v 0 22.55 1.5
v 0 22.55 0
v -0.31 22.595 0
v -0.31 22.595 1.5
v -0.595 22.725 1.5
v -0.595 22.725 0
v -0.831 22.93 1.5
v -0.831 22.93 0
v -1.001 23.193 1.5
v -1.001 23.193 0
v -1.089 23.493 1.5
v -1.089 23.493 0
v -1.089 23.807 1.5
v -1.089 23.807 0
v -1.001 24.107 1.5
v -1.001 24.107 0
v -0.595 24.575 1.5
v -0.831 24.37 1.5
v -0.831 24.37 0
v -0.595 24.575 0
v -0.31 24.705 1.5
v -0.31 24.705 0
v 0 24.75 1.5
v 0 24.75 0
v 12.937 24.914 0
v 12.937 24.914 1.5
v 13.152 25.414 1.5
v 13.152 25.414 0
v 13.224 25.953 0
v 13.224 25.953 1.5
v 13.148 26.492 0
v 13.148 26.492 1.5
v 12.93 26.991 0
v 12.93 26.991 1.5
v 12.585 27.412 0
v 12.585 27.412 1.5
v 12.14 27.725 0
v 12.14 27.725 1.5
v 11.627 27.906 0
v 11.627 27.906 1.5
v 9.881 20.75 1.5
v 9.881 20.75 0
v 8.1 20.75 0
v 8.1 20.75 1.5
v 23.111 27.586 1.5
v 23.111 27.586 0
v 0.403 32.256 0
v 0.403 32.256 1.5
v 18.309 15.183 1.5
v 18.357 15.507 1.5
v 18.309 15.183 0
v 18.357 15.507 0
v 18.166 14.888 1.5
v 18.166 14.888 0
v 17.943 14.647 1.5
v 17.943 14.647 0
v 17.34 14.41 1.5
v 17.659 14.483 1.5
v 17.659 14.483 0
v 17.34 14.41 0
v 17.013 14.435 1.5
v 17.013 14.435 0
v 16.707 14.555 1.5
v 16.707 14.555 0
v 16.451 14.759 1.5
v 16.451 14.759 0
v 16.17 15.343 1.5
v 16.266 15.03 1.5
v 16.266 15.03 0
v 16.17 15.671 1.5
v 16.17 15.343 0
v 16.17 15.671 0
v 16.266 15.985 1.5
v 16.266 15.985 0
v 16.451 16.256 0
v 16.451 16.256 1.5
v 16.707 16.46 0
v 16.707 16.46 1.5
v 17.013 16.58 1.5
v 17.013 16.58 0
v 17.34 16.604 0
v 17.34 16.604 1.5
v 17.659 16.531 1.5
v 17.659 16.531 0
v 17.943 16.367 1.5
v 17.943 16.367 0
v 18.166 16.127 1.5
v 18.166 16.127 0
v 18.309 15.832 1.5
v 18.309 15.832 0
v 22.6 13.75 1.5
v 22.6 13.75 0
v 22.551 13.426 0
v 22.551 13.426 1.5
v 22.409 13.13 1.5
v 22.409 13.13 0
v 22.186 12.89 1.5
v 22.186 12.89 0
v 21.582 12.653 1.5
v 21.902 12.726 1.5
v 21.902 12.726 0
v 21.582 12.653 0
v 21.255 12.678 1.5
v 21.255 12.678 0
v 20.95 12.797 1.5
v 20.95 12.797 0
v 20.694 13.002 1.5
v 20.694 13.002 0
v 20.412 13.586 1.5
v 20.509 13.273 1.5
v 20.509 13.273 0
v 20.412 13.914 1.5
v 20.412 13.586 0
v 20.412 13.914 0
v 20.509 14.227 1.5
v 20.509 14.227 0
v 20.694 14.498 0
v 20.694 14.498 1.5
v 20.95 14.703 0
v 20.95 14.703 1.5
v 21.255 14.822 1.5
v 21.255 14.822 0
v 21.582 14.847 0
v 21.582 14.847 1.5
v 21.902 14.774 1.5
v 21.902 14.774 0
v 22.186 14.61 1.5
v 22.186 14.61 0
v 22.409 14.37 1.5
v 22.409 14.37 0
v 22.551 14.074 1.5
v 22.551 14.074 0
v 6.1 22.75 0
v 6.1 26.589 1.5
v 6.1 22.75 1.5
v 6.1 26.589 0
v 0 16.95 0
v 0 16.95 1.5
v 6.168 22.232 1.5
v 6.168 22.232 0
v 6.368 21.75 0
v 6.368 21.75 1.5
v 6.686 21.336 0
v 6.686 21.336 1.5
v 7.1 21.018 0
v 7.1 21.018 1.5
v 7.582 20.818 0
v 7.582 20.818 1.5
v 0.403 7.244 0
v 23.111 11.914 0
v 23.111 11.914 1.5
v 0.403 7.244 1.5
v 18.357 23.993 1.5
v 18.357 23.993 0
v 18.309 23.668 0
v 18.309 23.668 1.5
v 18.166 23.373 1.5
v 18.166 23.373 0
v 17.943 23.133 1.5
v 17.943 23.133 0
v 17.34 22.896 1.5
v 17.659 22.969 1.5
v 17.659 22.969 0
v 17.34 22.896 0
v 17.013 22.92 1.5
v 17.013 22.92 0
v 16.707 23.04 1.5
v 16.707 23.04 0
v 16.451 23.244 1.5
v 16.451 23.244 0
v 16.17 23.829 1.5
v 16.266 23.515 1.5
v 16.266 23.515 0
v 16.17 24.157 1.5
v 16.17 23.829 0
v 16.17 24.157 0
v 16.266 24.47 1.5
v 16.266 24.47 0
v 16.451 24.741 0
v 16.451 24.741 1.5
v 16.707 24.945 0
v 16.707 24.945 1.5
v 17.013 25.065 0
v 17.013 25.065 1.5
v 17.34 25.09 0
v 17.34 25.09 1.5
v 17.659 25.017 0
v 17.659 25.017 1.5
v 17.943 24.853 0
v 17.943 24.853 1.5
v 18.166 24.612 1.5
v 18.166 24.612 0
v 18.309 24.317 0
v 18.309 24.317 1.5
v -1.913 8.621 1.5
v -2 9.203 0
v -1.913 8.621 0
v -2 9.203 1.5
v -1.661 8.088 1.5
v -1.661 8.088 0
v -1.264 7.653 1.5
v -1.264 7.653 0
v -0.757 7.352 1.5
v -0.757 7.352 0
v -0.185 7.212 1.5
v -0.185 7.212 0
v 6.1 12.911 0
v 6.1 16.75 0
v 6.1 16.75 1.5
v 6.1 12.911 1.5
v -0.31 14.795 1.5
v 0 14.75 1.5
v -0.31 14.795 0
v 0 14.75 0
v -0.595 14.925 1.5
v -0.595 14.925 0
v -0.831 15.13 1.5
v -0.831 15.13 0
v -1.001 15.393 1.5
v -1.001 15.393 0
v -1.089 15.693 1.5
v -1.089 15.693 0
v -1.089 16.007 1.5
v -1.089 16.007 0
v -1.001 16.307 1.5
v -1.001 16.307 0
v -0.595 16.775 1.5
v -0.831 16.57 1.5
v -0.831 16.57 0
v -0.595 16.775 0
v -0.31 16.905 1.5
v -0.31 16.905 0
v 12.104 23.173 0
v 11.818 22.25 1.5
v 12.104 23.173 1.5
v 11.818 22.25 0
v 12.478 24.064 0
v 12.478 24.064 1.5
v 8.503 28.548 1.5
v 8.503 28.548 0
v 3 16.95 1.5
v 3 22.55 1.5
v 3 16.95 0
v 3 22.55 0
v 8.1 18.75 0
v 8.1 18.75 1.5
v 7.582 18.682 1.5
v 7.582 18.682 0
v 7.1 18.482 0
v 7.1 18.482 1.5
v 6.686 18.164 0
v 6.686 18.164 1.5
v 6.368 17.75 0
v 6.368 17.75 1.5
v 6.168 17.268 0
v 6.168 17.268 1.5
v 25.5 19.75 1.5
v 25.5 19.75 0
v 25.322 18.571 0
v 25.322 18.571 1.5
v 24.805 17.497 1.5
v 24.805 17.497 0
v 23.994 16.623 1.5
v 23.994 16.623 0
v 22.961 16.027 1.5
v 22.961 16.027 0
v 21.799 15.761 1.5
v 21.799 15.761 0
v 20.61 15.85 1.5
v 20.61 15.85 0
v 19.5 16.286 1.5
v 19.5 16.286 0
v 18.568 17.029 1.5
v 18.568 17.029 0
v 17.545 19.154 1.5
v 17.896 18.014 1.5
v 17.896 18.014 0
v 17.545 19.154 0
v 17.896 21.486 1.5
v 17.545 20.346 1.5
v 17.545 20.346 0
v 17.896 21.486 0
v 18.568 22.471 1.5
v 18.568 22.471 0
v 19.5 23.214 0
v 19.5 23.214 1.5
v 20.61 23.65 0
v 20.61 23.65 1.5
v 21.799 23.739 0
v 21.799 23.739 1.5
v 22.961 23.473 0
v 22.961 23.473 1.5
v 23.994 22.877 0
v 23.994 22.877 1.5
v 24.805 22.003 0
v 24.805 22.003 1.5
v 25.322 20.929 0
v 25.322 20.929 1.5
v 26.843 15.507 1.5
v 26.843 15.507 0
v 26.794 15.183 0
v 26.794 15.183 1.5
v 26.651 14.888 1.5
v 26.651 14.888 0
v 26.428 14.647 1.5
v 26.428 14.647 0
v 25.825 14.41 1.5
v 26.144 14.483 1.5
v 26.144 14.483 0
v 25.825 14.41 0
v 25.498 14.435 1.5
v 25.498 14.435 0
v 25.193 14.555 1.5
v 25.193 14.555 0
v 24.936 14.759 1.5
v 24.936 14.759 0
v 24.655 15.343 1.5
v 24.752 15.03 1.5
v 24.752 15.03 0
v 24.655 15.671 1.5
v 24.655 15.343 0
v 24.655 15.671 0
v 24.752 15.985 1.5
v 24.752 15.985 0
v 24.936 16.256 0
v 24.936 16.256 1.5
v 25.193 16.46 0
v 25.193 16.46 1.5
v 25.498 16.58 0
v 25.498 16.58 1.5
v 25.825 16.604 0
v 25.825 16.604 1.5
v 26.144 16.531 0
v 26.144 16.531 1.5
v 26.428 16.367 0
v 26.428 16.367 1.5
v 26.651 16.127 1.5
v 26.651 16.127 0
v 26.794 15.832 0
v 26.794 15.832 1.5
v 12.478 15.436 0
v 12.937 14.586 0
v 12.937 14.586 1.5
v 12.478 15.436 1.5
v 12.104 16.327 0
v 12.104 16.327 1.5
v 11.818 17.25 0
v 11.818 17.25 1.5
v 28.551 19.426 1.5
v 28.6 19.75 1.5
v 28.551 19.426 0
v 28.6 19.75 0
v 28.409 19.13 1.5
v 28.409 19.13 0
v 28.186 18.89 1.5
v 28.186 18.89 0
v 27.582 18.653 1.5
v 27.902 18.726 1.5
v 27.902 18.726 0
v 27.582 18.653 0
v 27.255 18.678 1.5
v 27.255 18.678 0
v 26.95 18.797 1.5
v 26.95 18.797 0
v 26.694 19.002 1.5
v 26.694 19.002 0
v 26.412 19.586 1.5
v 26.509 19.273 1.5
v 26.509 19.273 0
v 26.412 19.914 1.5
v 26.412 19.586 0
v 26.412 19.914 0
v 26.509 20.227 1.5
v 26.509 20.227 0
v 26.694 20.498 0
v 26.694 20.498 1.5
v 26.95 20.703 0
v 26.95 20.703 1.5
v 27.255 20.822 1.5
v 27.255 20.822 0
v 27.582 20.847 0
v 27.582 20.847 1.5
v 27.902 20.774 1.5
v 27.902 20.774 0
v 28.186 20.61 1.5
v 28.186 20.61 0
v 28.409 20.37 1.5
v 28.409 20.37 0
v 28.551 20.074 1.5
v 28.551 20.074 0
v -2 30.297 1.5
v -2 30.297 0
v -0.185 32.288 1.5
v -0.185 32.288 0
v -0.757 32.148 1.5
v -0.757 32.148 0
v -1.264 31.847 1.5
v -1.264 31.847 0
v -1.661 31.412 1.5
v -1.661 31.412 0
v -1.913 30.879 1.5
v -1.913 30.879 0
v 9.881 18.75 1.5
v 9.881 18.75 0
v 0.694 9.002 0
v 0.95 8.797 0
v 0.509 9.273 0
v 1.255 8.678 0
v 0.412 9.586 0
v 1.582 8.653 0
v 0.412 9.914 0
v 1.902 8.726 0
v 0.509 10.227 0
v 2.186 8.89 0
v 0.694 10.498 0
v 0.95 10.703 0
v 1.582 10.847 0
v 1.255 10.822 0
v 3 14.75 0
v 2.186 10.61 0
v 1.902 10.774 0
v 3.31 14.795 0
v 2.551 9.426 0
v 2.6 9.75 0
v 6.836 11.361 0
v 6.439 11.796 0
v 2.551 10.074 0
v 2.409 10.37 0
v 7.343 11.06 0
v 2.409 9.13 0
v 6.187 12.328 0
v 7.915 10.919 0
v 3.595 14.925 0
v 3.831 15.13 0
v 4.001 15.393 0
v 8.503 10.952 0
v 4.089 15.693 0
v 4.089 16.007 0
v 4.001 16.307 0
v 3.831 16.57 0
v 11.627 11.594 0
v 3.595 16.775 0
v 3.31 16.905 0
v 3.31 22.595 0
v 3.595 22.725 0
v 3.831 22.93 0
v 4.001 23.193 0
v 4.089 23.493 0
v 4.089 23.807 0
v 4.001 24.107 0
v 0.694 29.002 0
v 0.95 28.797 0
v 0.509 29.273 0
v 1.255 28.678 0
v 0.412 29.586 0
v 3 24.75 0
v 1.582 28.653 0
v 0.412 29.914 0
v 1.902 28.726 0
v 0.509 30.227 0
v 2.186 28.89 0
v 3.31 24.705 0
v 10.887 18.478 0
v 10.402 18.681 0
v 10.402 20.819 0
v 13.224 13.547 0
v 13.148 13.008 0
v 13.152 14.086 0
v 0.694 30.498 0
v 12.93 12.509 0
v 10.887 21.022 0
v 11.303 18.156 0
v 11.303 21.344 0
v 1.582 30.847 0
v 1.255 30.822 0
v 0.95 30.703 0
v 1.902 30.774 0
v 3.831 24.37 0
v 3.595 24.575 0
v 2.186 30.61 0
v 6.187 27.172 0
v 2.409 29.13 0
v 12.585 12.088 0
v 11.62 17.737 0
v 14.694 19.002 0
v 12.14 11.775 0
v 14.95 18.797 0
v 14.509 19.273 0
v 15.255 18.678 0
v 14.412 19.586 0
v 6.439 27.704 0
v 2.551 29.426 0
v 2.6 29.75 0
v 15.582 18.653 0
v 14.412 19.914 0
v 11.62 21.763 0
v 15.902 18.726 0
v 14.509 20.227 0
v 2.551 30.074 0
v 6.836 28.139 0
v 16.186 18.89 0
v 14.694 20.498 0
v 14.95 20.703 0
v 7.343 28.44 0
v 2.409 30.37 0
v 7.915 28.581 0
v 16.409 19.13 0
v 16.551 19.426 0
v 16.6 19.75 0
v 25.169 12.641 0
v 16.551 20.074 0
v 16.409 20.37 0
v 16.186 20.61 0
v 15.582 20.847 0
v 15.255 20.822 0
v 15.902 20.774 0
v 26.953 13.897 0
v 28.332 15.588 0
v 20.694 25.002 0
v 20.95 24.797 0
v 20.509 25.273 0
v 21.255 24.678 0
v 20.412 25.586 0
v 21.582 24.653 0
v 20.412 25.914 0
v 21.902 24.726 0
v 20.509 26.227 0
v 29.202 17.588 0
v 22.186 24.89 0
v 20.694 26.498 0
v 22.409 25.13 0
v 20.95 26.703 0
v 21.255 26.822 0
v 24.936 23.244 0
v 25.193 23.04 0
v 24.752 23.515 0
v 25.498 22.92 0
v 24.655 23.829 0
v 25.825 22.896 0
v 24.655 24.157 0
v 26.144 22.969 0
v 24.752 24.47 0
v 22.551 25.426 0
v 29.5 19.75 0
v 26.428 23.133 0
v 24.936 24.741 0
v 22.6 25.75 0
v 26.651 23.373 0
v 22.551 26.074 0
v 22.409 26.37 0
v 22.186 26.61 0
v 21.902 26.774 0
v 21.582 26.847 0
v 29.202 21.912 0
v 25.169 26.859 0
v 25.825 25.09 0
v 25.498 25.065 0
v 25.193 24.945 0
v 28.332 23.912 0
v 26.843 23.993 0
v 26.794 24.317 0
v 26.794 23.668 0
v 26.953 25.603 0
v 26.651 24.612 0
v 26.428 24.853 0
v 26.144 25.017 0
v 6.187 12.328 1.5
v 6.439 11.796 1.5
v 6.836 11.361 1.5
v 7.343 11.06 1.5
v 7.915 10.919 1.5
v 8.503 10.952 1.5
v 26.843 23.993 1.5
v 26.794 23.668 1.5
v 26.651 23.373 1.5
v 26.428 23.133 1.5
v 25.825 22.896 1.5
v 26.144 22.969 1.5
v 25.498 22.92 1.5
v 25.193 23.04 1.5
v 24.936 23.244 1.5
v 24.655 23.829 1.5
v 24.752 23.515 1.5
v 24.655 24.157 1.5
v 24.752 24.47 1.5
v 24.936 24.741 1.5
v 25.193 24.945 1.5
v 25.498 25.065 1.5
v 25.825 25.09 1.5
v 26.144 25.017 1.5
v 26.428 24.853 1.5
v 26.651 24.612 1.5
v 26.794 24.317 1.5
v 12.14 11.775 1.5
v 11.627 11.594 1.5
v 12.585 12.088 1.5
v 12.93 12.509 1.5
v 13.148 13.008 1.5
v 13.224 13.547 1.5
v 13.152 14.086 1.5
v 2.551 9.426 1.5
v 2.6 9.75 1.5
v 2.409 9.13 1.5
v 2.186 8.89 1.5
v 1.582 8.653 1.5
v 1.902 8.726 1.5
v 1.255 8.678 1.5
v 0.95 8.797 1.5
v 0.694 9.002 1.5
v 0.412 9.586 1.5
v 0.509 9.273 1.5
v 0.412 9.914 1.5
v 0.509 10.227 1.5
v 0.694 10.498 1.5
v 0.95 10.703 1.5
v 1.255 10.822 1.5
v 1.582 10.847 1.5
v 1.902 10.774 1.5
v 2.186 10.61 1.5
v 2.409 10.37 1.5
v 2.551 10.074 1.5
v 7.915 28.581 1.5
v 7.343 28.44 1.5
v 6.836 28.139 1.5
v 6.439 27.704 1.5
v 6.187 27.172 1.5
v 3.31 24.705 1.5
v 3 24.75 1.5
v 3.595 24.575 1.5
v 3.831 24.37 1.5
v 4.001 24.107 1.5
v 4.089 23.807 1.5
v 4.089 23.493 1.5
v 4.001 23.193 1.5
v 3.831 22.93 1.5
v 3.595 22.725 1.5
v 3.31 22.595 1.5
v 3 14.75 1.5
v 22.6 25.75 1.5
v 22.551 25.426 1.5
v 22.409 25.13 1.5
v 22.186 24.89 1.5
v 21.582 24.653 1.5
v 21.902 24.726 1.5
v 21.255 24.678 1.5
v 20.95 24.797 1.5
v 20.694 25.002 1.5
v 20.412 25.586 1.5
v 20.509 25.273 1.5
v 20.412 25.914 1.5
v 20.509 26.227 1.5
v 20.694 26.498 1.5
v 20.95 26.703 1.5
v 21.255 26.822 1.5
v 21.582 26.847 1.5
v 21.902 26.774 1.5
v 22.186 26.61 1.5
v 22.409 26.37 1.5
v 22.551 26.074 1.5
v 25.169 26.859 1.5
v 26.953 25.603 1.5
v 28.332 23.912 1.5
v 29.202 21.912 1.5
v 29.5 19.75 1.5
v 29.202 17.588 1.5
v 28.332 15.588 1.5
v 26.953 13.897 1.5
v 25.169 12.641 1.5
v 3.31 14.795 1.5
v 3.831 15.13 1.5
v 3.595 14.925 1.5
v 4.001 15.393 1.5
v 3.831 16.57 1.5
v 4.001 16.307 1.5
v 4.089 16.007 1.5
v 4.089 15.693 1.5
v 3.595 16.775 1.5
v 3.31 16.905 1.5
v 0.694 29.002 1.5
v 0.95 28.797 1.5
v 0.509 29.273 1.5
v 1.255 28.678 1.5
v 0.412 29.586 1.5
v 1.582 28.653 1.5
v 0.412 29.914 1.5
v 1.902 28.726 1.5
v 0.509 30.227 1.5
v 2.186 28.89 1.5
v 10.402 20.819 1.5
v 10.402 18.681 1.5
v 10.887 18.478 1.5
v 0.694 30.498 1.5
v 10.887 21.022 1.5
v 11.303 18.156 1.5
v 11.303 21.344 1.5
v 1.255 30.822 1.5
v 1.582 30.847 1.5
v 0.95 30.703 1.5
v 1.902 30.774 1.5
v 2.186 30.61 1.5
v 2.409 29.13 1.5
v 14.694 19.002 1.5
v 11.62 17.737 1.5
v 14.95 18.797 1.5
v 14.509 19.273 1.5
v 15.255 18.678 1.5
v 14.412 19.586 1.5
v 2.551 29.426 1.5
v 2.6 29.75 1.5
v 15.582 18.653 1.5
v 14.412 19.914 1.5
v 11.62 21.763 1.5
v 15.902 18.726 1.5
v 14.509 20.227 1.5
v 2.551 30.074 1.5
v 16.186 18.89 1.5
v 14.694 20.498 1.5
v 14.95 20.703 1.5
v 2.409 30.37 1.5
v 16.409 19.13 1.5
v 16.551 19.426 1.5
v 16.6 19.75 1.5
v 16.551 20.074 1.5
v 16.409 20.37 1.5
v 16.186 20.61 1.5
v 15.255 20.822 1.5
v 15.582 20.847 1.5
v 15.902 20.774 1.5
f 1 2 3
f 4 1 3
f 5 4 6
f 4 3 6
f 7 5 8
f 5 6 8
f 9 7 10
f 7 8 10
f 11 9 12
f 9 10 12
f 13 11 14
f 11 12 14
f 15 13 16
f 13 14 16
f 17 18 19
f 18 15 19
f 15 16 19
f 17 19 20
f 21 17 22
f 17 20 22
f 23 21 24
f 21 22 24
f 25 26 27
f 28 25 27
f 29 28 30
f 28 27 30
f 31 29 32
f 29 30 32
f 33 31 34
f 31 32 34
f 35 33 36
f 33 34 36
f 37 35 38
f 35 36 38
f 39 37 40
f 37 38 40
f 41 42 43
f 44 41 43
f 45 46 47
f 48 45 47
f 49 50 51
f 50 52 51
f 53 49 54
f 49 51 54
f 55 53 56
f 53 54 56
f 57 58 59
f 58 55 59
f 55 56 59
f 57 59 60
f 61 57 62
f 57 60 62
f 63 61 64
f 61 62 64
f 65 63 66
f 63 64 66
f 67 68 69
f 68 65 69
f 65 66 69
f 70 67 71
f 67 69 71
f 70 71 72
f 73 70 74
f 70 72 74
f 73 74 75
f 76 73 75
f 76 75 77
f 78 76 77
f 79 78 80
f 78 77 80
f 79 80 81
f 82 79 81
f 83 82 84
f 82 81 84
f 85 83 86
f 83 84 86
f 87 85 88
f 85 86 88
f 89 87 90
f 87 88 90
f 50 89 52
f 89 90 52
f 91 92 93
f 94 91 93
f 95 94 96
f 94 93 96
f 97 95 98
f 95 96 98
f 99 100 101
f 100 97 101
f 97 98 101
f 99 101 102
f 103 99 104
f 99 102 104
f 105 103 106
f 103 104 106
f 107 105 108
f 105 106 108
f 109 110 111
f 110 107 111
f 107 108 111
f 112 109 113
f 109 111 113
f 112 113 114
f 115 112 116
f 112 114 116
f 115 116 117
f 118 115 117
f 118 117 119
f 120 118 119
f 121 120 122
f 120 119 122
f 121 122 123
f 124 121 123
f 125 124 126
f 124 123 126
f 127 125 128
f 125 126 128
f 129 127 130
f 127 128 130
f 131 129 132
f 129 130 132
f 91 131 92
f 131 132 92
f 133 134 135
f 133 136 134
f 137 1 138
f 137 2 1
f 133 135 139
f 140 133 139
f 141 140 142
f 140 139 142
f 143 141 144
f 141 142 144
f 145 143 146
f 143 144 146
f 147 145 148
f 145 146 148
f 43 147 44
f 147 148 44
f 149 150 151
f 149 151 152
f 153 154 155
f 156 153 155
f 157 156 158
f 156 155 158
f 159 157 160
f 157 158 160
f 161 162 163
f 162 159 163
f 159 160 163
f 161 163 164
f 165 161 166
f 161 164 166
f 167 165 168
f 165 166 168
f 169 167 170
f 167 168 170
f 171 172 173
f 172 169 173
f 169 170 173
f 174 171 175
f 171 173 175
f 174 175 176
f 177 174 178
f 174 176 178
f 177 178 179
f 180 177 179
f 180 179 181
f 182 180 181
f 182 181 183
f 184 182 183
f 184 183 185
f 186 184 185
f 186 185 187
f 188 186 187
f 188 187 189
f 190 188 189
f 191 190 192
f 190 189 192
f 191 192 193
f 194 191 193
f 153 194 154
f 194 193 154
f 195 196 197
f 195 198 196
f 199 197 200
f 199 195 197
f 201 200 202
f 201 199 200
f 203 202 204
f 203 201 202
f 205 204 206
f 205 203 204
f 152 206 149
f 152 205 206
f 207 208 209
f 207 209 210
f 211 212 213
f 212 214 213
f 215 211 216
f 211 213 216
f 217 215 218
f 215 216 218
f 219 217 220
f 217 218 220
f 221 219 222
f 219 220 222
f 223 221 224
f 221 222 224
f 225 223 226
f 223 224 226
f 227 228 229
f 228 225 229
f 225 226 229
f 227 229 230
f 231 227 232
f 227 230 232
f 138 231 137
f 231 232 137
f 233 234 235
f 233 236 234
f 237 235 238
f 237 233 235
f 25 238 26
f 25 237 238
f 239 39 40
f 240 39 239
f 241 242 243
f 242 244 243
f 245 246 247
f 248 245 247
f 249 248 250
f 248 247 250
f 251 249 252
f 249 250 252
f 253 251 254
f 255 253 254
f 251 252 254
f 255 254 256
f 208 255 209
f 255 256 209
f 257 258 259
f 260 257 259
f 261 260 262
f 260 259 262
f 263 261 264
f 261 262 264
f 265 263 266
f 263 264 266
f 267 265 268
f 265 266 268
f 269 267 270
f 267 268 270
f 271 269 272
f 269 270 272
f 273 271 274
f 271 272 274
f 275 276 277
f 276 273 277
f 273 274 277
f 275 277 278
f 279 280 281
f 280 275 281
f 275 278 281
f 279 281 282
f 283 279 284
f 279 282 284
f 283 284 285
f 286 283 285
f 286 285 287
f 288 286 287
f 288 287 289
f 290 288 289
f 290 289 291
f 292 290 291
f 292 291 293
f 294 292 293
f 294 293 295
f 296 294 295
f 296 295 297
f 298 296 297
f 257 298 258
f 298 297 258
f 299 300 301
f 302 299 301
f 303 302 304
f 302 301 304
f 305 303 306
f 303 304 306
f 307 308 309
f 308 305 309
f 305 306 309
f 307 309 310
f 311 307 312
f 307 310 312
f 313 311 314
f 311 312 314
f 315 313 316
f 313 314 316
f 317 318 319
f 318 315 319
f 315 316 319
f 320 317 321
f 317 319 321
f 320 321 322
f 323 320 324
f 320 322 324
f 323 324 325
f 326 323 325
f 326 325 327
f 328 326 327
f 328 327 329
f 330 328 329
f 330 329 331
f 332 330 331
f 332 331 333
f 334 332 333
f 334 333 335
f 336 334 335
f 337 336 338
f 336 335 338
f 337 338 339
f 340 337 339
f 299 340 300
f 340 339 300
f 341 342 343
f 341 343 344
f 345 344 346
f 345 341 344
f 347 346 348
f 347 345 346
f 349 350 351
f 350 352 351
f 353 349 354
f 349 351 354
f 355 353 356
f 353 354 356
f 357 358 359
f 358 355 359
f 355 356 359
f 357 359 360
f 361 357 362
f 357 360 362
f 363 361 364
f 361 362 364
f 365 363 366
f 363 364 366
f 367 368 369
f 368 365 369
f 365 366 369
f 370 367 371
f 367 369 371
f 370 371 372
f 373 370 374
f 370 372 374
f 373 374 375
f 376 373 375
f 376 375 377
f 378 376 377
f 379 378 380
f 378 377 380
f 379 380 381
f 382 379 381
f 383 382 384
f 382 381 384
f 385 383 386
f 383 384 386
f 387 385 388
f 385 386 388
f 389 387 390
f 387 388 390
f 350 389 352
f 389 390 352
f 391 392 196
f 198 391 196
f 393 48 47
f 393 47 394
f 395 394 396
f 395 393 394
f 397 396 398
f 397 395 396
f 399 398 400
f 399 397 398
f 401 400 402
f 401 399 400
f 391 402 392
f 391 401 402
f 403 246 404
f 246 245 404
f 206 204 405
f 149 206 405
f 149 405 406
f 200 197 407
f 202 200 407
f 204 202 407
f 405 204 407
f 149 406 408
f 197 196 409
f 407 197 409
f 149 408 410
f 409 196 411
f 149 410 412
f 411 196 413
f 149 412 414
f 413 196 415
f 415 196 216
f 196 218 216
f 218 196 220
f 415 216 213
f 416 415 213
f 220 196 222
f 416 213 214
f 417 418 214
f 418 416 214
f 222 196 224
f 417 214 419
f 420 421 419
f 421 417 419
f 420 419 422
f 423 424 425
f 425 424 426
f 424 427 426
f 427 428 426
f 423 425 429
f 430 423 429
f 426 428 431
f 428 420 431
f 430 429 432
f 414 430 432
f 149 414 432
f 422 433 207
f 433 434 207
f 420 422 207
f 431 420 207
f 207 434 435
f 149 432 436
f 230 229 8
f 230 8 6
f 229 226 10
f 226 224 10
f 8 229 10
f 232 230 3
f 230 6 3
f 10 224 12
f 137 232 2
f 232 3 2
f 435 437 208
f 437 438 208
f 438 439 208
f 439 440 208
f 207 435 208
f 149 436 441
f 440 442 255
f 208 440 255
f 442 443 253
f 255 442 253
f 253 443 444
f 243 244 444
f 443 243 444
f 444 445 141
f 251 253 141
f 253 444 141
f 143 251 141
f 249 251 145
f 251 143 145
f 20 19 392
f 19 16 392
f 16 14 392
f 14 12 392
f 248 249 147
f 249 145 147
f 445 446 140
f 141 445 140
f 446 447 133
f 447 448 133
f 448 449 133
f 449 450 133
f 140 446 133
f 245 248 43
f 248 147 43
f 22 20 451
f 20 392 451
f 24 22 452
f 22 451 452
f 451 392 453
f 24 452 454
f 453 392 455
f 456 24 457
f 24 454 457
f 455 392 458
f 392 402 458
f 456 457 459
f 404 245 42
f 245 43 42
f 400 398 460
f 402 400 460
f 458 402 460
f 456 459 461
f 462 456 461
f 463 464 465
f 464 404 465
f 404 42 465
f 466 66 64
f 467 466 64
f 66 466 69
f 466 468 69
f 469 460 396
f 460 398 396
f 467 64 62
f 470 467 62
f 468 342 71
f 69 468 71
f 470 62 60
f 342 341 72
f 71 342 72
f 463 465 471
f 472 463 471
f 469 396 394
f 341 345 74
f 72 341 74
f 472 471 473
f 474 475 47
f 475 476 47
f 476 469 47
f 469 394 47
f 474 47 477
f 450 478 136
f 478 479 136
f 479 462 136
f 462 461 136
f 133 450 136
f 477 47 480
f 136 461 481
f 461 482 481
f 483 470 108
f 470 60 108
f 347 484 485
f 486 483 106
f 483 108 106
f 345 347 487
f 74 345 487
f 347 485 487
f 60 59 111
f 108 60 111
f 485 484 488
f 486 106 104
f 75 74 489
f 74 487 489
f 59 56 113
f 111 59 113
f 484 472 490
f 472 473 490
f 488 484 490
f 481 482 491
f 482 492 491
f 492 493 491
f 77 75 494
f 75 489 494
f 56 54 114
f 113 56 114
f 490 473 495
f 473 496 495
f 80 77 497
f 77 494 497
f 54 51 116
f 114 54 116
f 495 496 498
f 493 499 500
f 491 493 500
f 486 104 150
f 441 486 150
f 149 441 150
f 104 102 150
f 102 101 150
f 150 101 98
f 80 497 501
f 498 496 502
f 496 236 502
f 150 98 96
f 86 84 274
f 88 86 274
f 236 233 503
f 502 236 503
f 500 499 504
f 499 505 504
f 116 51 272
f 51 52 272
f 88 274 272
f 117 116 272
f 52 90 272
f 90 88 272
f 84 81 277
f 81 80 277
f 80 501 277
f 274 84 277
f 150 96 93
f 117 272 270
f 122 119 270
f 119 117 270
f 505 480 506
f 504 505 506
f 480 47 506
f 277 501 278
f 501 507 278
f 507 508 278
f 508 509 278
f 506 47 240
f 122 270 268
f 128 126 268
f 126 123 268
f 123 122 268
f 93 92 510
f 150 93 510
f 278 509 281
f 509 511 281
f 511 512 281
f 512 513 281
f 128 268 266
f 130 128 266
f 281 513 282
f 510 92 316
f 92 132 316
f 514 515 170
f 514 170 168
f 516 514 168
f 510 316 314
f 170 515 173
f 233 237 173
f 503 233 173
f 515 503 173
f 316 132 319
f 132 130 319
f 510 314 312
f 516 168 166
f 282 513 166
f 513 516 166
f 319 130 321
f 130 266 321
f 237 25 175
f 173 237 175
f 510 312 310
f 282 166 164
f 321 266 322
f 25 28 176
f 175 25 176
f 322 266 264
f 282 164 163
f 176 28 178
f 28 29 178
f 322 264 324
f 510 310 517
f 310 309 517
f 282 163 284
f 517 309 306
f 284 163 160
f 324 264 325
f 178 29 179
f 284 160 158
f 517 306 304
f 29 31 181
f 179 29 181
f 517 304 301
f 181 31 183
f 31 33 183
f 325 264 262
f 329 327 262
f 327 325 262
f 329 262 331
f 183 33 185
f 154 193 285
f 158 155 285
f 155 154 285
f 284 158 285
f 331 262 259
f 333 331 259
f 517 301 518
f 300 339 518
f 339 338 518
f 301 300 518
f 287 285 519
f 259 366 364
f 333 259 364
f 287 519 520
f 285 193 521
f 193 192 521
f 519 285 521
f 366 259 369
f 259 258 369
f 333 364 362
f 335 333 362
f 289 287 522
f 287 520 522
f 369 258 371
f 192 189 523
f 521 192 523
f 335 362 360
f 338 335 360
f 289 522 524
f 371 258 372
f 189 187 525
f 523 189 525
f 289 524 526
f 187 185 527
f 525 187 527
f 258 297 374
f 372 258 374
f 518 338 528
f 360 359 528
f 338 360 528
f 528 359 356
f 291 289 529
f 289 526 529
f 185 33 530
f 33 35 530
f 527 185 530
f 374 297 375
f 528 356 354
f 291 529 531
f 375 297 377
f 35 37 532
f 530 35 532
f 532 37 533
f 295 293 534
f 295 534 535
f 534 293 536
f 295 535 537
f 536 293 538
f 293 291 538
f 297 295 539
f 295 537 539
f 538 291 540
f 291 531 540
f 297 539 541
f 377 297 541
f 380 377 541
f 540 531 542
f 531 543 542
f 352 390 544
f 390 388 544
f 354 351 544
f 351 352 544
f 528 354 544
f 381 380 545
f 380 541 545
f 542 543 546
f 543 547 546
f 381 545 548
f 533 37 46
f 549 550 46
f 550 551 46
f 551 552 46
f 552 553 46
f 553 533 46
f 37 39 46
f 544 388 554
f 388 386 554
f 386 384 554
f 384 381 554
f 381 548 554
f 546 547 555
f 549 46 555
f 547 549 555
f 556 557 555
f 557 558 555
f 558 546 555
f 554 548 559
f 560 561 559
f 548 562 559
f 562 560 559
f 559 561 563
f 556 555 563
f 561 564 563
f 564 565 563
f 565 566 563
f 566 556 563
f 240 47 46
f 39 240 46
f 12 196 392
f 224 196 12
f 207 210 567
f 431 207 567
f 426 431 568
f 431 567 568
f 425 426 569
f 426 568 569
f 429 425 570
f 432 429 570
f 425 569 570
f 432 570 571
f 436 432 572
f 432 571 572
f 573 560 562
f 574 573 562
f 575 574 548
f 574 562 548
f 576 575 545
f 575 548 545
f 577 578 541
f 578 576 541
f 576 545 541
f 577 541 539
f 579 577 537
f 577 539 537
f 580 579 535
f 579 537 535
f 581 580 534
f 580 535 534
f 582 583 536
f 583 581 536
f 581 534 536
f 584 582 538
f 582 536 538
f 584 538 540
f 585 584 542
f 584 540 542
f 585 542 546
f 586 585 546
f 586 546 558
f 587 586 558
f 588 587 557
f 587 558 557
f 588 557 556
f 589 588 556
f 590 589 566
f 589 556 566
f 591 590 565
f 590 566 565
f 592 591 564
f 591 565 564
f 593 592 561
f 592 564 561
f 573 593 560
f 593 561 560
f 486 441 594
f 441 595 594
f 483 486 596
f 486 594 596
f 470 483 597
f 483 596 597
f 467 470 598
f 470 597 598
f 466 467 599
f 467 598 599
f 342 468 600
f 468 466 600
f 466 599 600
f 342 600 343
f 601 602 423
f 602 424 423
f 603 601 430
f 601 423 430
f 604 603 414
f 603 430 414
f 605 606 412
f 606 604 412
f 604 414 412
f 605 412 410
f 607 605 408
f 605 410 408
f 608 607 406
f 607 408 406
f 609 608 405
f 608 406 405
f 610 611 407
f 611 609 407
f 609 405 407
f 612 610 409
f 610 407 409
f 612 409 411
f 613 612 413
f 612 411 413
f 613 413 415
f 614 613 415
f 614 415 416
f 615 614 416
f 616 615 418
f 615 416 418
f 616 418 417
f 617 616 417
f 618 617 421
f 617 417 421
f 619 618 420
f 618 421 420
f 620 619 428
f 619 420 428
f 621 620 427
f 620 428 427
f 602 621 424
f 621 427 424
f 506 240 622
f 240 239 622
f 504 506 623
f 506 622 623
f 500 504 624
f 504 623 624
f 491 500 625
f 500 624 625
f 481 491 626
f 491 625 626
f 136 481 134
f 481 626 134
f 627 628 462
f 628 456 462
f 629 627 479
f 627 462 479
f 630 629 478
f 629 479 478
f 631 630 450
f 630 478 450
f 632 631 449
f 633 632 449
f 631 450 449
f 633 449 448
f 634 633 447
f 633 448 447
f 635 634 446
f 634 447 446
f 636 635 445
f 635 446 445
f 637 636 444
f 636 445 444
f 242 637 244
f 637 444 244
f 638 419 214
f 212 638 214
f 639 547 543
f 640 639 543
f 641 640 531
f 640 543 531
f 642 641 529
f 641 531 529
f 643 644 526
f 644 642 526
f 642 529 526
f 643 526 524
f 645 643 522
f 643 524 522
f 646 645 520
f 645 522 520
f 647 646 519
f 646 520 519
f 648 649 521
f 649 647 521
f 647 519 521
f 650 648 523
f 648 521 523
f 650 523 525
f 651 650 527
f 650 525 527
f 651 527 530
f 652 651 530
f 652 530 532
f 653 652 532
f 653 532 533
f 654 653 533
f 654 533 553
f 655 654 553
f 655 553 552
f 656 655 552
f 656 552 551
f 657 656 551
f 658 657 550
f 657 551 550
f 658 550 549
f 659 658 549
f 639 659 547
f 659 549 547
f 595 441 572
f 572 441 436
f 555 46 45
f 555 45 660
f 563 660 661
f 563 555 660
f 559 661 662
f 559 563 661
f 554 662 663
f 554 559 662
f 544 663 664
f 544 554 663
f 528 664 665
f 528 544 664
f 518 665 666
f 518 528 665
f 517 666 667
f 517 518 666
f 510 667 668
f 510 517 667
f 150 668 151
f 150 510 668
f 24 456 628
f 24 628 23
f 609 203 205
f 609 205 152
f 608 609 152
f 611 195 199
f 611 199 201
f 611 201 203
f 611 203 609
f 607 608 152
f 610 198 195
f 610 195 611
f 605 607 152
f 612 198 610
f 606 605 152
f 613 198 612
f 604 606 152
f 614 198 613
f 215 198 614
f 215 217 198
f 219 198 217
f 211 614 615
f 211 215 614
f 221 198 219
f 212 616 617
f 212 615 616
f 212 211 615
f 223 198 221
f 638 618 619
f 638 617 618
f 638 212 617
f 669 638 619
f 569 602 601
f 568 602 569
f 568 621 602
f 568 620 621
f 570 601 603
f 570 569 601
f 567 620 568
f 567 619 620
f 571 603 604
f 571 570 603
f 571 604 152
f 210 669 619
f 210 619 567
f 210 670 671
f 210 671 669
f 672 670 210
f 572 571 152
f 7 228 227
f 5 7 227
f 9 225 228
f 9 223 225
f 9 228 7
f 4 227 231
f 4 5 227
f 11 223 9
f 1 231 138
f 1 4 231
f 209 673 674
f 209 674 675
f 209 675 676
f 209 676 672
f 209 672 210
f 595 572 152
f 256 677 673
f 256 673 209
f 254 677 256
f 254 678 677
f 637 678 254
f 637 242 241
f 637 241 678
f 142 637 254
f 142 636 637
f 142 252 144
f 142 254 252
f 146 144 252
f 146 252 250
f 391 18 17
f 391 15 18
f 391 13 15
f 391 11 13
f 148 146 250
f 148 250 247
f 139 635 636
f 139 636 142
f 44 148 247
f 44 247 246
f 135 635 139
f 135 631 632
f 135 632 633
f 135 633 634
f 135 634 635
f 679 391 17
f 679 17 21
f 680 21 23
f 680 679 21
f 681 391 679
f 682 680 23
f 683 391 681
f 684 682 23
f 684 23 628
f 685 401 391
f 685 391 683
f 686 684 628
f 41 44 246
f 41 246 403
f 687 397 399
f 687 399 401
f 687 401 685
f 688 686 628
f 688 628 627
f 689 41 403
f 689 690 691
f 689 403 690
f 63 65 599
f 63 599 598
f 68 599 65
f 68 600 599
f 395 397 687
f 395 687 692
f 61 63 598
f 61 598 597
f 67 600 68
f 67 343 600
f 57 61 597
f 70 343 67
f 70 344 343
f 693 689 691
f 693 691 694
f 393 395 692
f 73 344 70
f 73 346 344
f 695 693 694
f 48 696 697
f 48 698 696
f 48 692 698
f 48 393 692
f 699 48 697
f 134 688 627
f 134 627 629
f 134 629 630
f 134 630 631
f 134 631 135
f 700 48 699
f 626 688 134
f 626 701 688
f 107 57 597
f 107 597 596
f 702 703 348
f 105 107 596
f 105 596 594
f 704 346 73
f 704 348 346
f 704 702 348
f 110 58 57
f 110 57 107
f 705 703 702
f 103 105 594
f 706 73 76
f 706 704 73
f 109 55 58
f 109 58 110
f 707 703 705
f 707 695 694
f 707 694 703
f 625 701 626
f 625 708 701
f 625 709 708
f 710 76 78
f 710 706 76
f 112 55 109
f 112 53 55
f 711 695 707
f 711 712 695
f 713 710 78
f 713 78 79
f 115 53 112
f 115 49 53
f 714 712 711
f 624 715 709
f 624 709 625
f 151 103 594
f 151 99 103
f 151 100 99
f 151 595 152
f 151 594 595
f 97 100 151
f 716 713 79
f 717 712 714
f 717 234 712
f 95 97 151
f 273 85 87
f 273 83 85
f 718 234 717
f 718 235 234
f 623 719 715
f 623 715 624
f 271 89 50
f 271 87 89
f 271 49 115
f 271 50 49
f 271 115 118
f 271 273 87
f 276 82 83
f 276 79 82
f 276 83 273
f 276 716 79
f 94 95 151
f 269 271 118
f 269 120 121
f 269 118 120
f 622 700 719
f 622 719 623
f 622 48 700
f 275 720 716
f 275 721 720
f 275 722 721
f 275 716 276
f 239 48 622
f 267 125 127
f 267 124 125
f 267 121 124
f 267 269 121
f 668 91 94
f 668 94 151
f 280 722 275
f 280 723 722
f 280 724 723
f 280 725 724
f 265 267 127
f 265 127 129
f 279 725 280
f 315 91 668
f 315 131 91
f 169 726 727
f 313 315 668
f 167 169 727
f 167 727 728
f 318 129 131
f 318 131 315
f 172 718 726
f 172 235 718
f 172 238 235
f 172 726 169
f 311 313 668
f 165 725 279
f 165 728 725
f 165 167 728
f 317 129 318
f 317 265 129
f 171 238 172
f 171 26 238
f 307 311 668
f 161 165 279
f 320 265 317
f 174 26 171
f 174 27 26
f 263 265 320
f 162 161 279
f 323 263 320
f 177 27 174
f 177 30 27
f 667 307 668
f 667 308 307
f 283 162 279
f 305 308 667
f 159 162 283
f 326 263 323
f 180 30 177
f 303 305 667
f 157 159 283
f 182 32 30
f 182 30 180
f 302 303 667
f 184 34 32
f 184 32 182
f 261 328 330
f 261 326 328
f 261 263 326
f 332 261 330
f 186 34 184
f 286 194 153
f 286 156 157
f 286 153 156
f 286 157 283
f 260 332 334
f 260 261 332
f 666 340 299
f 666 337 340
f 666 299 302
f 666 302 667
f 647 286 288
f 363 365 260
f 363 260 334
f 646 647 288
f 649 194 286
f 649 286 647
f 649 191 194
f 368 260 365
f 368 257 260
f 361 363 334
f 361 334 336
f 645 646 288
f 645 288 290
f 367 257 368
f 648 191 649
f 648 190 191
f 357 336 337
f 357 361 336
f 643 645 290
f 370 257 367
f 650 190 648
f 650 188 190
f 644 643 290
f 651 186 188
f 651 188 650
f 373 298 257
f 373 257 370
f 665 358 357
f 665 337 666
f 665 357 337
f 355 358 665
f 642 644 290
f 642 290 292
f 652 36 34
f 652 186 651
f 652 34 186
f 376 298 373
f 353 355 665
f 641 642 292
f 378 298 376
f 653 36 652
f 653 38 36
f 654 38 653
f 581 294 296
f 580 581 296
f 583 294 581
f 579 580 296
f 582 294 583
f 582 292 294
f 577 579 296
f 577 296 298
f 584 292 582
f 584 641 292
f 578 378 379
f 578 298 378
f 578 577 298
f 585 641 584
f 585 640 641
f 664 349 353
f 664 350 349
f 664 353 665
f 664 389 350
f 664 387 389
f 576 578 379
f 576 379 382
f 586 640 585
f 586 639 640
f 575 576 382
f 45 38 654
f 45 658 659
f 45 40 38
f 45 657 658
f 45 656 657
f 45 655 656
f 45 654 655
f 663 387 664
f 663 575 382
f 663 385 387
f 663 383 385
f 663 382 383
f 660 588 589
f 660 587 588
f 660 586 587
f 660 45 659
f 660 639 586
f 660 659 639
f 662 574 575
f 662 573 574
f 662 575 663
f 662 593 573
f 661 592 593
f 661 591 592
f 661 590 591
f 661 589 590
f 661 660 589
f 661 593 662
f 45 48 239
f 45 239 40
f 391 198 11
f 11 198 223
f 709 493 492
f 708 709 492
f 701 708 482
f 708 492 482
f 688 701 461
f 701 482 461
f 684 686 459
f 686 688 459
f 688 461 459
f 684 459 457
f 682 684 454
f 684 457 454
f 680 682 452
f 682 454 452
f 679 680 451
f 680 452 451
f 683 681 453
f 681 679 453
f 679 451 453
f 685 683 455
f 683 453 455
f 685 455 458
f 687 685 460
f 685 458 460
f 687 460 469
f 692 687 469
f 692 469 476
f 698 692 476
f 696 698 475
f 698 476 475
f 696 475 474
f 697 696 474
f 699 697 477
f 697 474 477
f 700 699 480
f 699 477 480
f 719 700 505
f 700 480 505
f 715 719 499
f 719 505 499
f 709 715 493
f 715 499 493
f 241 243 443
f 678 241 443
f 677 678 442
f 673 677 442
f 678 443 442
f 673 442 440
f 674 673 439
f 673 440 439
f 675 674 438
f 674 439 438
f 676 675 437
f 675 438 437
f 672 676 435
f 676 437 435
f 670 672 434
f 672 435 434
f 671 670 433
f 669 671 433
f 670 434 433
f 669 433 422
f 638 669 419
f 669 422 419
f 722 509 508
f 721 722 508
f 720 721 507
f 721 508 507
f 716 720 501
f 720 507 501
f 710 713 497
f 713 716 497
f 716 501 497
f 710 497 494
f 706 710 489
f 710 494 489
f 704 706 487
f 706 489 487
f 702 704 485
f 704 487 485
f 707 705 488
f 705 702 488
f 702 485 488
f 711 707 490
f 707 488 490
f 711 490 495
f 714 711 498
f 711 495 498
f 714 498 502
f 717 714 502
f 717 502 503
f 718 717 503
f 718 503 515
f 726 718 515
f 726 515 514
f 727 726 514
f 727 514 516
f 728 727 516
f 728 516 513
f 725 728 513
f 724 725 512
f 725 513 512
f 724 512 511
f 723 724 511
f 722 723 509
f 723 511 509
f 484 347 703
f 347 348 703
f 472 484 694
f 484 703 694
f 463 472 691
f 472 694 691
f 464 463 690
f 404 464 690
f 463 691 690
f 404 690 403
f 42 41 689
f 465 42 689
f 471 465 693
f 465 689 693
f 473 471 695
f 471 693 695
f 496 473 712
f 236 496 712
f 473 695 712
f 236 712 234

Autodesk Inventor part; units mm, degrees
ref_plane "YZ Plane" through (0, 0, 0) normal (1, 0, 0) x (0, 1, 0)
ref_plane "XZ Plane" through (0, 0, 0) normal (0, 1, 0) x (-1, 0, 0)
ref_plane "XY Plane" through (0, 0, 0) normal (0, 0, 1) x (1, 0, 0)
sketch "スケッチ1" plane through (0, 0, 0) normal (0, 0, 1) x (1, 0, 0)
  circle A0 centre (1.5, 29.75) radius 0.7835 projected
  circle A1 centre (1.5, 9.75) radius 0.7835 projected
  line L0 (3, 24.75) -> (3, 14.75) projected
  line L1 (0, 24.75) -> (0, 14.75) projected
  line L2 (3, 24.75) -> (0, 24.75) projected
  line L3 (3, 14.75) -> (0, 14.75) projected
  circle A2 centre (3, 23.65) radius 1.1
  line L4 (3, 19.75) -> (0, 19.75) construction
  line L5 (1.5, 19.75) -> (1.5, 24.75) construction
  circle A3 centre (0, 23.65) radius 1.1
  line L6 (3, 14.75) -> (0, 14.75)
  circle A4 centre (3, 15.85) radius 1.1
  circle A5 centre (0, 15.85) radius 1.1
  circle A6 centre (1.5, 29.75) radius 1.1
  circle A7 centre (1.5, 9.75) radius 1.1
  line L7 (5.9977, 32.75) -> (-2, 32.75) construction
  line L8 (-2, 32.75) -> (-2, 6.75)
  line L9 (-2, 6.75) -> (5.9977, 6.75) construction
  line L10 (5.9977, 6.75) -> (5.9977, 32.75) construction
  line L11 (3, 32.75) -> (0, 32.75) projected
  line L12 (0, 6.75) -> (3, 6.75) projected
  circle A8 centre (21.5, 19.75) radius 4
  circle A9 centre (27.5, 19.75) radius 1.1
  circle A10 centre (25.7426, 23.9926) radius 1.1
  circle A11 centre (21.5, 25.75) radius 1.1
  circle A12 centre (17.2574, 23.9926) radius 1.1
  circle A13 centre (15.5, 19.75) radius 1.1
  circle A14 centre (17.2574, 15.5074) radius 1.1
  circle A15 centre (21.5, 13.75) radius 1.1
  circle A16 centre (25.7426, 15.5074) radius 1.1
  circle A17 centre (21.5, 19.75) radius 8
  line L13 (23.1114, 27.586) -> (-2, 32.75)
  line L14 (23.1114, 11.914) -> (-2, 6.75)
  point P0 (0, 0)
  point P1 (1.5, 14.75)
  point P2 (0, 16.95)
  point P3 (0, 22.55)
  point P4 (3, 22.55)
  point P5 (3, 16.95)
  dimension "d0" = 2.2
  dimension "d12" = 16
  dimension "d1" = 2.2
  dimension "d2" = 2
  dimension "d3" = 8
  dimension "d4" = 13
  dimension "d5" = 20
  dimension "d6" = 2.2
  dimension "d7" = 6
  dimension "d10" = 360
extrude "押し出し1" add sketch "スケッチ1" along normal blind 1.5 contours L13 A17 L14 L8 | A17
fillet "フィレット1" radius 2 2 edges at (-2, 32.75, 0.75) (-2, 6.75, 0.75)
sketch "スケッチ2" plane through (0, 0, 0) normal (0, 0, -1) x (-1, 0, 0)
  circle A0 centre (-21.5, 19.75) radius 4 projected
  circle A1 centre (-21.5, 19.75) radius 8
  line L0 (-23.1114, 27.586) -> (-0.4029, 32.2559) projected
  line L1 (-6.1, 31.0843) -> (-6.1, 8.4157)
  arc A2 (-3, 24.75) -> (-3, 22.55) centre (-3, 23.65) ccw projected
  line L2 (-0.4029, 7.2441) -> (-23.1114, 11.914) projected
  circle A3 centre (-21.5, 19.75) radius 10
  line L3 (-14.8725, 27.2384) -> (-6.1, 29.0424)
  line L4 (-6.1, 19.75) -> (-11.5, 19.75) construction
  line L5 (-14.8725, 12.2616) -> (-6.1, 10.4576)
  line L6 (-6.0499, 18.75) -> (-11.5501, 18.75)
  line L7 (-11.5501, 18.75) -> (-11.5501, 20.75)
  line L8 (-11.5501, 20.75) -> (-6.0499, 20.75)
  line L9 (-6.0499, 20.75) -> (-6.0499, 18.75)
  line L10 (-6.0499, 18.75) -> (-11.5501, 20.75) construction
  line L11 (-11.5501, 18.75) -> (-6.0499, 20.75) construction
  point P0 (0, 0)
  point P1 (-4.1, 23.65)
  point P2 (-8.8, 19.75)
  point P3 (-6.1, 18.75)
  point P4 (-6.1, 20.75)
  dimension "d16" = 2
  dimension "d17" = 2
  dimension "d18" = 2
  dimension "d22" = 2
extrude "押し出し2" cut sketch "スケッチ2" against normal blind 1.5 contours L3 L1 L8 A3 | A3 L6 L1 L5
fillet "フィレット2" radius 2 8 edges at (14.8725, 27.2384, 0.75) (14.8725, 12.2616, 0.75) (6.1, 10.4576, 0.75) (6.1, 29.0424, 0.75) (11.5501, 20.75, 0.75) (6.1, 20.75, 0.75) (6.1, 18.75, 0.75) (11.5501, 18.75, 0.75)
equation "\"d18\" = d17"
properties part number "kata_new_1.5" material "アルミニウム 2014-T4"
